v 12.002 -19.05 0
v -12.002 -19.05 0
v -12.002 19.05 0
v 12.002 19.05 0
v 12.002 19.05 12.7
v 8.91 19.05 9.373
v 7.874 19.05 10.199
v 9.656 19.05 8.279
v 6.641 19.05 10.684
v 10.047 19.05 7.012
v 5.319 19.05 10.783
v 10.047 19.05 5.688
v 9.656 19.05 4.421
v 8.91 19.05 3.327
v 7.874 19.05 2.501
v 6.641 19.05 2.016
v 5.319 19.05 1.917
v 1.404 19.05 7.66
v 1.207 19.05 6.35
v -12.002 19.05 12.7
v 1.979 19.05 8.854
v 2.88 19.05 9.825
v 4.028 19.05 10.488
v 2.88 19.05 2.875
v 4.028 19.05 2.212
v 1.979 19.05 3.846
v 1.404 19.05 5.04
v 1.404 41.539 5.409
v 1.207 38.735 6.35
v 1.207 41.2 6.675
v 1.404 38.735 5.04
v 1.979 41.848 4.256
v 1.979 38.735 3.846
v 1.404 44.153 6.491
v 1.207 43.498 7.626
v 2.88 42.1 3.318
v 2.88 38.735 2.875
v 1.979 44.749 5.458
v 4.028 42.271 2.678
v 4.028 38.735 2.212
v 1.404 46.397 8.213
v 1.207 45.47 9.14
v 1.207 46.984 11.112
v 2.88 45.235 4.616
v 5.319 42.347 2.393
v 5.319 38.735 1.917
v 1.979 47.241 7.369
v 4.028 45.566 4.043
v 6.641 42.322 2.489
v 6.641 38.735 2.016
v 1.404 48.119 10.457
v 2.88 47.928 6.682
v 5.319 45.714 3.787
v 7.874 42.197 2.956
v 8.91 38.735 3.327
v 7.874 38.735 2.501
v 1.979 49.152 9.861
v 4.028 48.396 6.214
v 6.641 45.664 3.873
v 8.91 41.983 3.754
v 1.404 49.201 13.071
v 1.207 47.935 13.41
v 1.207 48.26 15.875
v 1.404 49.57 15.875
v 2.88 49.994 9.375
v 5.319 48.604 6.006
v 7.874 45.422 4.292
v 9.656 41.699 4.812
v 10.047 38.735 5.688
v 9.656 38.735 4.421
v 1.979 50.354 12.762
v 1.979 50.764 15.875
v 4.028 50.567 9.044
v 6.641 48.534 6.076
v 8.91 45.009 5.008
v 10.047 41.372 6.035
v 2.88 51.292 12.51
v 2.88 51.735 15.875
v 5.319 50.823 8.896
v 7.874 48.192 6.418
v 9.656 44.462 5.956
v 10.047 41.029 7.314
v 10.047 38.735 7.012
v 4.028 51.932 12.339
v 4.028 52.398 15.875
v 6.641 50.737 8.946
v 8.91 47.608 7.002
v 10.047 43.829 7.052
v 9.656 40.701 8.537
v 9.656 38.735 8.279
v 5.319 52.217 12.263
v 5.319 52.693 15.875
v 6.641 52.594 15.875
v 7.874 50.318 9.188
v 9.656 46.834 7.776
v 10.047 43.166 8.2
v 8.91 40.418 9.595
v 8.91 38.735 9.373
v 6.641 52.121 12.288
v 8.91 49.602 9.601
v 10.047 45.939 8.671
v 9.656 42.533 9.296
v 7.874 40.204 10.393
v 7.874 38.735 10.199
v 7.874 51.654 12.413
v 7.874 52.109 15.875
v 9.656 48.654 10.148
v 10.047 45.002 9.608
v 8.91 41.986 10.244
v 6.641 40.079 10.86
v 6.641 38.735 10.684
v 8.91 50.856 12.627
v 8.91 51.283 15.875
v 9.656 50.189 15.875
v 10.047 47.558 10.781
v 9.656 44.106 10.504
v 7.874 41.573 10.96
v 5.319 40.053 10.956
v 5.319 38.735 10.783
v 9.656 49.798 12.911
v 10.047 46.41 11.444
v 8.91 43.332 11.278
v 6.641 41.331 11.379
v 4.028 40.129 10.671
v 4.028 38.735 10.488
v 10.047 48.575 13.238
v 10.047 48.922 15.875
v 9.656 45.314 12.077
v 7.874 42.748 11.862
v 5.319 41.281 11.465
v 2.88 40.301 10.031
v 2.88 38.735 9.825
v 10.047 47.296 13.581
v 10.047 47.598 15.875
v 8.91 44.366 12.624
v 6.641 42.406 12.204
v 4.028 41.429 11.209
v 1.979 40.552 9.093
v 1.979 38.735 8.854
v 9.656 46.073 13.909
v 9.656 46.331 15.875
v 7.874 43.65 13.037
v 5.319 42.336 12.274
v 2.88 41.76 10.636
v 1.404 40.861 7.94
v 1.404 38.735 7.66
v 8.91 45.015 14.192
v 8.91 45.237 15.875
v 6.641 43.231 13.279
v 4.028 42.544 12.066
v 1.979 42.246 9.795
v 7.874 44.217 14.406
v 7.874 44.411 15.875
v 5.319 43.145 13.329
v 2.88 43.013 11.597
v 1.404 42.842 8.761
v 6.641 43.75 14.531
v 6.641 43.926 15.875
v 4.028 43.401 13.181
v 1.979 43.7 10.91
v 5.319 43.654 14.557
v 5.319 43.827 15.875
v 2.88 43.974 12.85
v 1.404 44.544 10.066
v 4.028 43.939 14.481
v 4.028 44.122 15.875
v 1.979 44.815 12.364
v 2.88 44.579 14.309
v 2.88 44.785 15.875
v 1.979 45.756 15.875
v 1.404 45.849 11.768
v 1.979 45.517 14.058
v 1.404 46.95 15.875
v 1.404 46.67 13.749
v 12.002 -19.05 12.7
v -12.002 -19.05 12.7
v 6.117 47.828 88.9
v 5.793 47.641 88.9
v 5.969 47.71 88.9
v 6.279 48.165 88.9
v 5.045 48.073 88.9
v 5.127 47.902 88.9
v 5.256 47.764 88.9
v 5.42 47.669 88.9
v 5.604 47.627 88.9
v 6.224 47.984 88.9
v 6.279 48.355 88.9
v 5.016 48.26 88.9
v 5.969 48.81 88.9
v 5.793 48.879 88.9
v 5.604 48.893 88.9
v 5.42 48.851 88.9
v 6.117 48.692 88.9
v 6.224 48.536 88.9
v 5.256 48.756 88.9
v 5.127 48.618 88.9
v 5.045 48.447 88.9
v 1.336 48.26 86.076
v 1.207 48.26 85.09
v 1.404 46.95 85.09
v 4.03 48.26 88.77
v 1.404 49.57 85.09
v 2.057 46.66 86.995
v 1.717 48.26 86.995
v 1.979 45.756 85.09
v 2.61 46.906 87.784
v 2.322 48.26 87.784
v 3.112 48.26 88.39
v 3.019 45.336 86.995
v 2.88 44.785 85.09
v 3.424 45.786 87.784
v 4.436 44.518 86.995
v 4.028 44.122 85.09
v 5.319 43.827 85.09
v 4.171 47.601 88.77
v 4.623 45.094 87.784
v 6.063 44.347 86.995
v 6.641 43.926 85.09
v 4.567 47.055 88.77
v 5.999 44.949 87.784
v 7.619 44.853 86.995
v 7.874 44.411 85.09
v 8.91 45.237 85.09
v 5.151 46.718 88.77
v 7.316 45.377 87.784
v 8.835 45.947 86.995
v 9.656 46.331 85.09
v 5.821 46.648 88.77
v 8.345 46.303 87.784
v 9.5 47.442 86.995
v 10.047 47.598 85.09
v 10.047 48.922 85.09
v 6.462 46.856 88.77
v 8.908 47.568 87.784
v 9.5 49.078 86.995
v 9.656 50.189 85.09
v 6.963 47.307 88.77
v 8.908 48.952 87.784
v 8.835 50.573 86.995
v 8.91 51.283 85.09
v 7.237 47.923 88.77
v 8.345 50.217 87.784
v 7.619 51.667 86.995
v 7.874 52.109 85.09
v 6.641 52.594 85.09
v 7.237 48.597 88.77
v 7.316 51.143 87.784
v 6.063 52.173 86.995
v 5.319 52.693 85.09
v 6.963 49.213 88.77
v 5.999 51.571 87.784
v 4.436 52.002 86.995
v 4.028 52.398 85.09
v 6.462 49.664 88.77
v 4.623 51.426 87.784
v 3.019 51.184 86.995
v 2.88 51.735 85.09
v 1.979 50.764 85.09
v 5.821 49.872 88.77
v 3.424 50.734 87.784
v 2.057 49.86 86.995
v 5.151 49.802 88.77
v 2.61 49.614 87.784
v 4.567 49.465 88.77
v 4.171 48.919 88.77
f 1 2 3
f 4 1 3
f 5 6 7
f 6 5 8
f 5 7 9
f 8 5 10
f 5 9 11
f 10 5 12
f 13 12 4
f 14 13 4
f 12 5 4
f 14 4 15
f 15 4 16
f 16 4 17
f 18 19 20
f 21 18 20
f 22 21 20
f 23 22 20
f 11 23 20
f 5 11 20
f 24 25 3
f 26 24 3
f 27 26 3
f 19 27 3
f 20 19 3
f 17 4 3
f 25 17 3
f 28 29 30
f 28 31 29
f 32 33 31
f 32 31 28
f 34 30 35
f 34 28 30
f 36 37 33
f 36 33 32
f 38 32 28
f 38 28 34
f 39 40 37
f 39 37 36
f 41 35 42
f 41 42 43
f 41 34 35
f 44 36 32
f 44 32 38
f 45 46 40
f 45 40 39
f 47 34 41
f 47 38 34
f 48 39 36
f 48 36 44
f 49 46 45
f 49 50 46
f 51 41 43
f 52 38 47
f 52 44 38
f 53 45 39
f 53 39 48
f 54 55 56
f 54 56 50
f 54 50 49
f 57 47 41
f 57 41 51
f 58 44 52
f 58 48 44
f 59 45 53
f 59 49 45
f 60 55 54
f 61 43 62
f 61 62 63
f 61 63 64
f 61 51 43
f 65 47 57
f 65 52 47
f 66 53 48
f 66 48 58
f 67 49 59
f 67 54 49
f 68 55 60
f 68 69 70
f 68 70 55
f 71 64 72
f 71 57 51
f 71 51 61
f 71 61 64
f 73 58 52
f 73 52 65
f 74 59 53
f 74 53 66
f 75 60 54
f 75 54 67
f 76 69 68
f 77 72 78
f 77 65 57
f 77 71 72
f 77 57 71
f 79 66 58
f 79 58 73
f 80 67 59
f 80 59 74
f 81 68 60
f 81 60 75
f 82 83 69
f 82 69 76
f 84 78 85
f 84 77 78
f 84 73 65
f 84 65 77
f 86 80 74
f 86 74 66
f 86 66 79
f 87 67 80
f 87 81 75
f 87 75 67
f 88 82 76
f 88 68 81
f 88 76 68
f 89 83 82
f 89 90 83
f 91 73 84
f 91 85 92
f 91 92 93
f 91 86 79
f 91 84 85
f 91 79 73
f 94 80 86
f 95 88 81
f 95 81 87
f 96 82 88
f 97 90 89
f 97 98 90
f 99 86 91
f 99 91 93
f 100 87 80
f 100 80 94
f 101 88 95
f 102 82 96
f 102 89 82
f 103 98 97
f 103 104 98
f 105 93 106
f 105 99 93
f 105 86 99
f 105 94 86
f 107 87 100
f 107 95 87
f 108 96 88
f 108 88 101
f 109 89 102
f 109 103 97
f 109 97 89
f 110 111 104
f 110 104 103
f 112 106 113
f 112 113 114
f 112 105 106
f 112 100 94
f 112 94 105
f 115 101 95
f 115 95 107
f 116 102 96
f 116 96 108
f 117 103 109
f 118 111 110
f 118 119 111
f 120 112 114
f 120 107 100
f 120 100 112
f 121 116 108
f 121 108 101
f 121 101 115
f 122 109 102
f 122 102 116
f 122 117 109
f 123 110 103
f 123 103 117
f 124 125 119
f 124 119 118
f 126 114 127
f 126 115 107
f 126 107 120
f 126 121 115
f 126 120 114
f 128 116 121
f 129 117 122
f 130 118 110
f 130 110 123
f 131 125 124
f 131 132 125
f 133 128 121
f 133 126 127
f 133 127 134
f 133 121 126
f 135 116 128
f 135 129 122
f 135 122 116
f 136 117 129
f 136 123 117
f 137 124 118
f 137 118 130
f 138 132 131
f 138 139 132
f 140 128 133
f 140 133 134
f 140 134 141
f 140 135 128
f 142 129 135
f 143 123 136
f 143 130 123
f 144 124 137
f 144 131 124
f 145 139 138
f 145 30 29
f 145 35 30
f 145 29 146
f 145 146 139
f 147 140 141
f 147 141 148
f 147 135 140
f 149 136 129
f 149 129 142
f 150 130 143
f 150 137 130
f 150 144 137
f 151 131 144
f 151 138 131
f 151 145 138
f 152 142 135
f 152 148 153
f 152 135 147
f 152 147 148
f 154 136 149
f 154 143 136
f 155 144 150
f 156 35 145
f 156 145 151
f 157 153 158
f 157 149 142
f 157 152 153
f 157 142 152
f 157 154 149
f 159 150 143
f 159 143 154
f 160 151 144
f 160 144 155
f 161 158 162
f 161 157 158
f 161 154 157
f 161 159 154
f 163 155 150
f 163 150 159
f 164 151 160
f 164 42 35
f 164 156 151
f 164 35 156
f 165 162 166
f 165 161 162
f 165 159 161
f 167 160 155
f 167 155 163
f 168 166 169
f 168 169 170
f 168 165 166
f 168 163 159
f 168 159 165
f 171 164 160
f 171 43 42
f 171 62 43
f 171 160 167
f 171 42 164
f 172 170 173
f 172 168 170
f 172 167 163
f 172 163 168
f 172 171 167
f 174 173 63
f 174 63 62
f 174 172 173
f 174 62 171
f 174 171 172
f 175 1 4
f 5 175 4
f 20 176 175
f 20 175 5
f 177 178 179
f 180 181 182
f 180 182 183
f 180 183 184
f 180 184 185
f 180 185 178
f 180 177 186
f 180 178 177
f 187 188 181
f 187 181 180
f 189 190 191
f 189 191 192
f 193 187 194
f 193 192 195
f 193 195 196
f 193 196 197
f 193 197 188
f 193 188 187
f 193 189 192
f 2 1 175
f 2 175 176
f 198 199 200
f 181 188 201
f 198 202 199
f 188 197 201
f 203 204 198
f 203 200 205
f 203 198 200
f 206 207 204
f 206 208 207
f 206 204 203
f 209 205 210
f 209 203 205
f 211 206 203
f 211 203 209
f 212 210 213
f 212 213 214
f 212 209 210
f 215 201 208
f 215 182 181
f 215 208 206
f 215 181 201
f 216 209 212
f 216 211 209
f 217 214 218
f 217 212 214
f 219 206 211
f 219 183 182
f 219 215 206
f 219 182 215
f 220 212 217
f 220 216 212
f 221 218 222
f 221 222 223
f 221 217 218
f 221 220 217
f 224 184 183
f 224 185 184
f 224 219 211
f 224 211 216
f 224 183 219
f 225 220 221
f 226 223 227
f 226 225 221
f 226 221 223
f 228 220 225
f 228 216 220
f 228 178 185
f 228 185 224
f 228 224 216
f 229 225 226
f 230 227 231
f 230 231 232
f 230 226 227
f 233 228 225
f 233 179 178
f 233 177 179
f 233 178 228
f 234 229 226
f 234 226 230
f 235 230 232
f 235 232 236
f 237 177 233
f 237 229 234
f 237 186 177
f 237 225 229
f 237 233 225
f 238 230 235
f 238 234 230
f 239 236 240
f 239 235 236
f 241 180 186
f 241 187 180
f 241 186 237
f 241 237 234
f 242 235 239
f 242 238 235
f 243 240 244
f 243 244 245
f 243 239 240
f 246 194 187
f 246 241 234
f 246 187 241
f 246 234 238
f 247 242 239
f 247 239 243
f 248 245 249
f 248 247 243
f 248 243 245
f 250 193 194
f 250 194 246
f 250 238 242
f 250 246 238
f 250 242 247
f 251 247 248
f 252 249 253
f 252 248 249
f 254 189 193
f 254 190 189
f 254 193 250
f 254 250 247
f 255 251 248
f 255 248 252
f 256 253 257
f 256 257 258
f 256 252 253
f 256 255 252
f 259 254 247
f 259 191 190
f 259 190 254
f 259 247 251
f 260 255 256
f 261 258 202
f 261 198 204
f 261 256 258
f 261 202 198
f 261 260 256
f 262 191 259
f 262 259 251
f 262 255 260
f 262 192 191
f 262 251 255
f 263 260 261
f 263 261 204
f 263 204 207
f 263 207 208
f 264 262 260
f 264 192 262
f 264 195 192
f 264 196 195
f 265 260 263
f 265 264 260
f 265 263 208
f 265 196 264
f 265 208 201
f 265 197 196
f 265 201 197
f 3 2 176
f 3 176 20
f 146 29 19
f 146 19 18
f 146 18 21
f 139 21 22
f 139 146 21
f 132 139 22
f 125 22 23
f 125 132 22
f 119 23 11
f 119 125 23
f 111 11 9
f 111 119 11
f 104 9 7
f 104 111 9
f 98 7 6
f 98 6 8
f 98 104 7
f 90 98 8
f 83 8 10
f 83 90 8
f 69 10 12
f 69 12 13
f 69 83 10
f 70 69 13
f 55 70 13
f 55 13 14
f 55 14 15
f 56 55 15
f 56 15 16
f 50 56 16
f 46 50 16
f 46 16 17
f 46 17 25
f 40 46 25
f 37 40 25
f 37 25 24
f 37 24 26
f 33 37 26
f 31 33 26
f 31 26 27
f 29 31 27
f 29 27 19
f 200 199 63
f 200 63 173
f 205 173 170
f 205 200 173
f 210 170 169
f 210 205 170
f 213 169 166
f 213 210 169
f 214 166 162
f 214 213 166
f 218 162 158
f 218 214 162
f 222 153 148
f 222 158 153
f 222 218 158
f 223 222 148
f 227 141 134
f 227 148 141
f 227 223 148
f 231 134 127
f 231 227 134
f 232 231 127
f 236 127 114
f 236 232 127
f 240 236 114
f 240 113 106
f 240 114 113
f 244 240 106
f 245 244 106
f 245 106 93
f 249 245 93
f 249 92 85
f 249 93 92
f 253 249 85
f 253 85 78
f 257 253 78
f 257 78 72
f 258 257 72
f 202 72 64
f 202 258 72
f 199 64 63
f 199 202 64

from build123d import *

# Parameters (mm, degrees)
SKETCH1_W           = 38.1
SKETCH1_H           = 24.003
BOSS_EXTRUDE1_DEPTH = 12.7
SKETCH3_R           = 4.445
FILLET1_R           = 3.81


with BuildPart() as part:
    # Sketch1 → Boss-Extrude1 (new body)
    with BuildSketch(Plane(origin=(0, 0, 0), x_dir=(0, 1, 0), z_dir=(0, 0, 1))):
        Rectangle(SKETCH1_W, SKETCH1_H)
    extrude(amount=BOSS_EXTRUDE1_DEPTH)

    # Sweep1: sweep along a path in Sketch2
    with BuildLine(Plane(origin=(5.6515, 0, 0), x_dir=(0, 0, -1), z_dir=(1, 0, 0))) as sweep1_path:
        Line((-6.35, 19.05), (-6.35, 38.735))
        ThreePointArc((-6.35, 38.735), (-9.139807909, 45.470192091), (-15.875, 48.26))
        Line((-15.875, 48.26), (-88.9, 48.26))
    # Sketch3 → Sweep1 (sweep)
    with BuildSketch(Plane(origin=(0, 19.05, 0), x_dir=(-1, 0, 0), z_dir=(0, 1, 0))):
        with Locations((-5.6515, 6.35)):
            Circle(SKETCH3_R)
    sweep(path=sweep1_path.line)

    # Fillet1
    fillet1_edges = [part.edges().sort_by_distance(p)[0] for p in [
        (10.0965, 48.26, 88.9),
    ]]
    fillet(fillet1_edges, radius=FILLET1_R)


solid = part.part
